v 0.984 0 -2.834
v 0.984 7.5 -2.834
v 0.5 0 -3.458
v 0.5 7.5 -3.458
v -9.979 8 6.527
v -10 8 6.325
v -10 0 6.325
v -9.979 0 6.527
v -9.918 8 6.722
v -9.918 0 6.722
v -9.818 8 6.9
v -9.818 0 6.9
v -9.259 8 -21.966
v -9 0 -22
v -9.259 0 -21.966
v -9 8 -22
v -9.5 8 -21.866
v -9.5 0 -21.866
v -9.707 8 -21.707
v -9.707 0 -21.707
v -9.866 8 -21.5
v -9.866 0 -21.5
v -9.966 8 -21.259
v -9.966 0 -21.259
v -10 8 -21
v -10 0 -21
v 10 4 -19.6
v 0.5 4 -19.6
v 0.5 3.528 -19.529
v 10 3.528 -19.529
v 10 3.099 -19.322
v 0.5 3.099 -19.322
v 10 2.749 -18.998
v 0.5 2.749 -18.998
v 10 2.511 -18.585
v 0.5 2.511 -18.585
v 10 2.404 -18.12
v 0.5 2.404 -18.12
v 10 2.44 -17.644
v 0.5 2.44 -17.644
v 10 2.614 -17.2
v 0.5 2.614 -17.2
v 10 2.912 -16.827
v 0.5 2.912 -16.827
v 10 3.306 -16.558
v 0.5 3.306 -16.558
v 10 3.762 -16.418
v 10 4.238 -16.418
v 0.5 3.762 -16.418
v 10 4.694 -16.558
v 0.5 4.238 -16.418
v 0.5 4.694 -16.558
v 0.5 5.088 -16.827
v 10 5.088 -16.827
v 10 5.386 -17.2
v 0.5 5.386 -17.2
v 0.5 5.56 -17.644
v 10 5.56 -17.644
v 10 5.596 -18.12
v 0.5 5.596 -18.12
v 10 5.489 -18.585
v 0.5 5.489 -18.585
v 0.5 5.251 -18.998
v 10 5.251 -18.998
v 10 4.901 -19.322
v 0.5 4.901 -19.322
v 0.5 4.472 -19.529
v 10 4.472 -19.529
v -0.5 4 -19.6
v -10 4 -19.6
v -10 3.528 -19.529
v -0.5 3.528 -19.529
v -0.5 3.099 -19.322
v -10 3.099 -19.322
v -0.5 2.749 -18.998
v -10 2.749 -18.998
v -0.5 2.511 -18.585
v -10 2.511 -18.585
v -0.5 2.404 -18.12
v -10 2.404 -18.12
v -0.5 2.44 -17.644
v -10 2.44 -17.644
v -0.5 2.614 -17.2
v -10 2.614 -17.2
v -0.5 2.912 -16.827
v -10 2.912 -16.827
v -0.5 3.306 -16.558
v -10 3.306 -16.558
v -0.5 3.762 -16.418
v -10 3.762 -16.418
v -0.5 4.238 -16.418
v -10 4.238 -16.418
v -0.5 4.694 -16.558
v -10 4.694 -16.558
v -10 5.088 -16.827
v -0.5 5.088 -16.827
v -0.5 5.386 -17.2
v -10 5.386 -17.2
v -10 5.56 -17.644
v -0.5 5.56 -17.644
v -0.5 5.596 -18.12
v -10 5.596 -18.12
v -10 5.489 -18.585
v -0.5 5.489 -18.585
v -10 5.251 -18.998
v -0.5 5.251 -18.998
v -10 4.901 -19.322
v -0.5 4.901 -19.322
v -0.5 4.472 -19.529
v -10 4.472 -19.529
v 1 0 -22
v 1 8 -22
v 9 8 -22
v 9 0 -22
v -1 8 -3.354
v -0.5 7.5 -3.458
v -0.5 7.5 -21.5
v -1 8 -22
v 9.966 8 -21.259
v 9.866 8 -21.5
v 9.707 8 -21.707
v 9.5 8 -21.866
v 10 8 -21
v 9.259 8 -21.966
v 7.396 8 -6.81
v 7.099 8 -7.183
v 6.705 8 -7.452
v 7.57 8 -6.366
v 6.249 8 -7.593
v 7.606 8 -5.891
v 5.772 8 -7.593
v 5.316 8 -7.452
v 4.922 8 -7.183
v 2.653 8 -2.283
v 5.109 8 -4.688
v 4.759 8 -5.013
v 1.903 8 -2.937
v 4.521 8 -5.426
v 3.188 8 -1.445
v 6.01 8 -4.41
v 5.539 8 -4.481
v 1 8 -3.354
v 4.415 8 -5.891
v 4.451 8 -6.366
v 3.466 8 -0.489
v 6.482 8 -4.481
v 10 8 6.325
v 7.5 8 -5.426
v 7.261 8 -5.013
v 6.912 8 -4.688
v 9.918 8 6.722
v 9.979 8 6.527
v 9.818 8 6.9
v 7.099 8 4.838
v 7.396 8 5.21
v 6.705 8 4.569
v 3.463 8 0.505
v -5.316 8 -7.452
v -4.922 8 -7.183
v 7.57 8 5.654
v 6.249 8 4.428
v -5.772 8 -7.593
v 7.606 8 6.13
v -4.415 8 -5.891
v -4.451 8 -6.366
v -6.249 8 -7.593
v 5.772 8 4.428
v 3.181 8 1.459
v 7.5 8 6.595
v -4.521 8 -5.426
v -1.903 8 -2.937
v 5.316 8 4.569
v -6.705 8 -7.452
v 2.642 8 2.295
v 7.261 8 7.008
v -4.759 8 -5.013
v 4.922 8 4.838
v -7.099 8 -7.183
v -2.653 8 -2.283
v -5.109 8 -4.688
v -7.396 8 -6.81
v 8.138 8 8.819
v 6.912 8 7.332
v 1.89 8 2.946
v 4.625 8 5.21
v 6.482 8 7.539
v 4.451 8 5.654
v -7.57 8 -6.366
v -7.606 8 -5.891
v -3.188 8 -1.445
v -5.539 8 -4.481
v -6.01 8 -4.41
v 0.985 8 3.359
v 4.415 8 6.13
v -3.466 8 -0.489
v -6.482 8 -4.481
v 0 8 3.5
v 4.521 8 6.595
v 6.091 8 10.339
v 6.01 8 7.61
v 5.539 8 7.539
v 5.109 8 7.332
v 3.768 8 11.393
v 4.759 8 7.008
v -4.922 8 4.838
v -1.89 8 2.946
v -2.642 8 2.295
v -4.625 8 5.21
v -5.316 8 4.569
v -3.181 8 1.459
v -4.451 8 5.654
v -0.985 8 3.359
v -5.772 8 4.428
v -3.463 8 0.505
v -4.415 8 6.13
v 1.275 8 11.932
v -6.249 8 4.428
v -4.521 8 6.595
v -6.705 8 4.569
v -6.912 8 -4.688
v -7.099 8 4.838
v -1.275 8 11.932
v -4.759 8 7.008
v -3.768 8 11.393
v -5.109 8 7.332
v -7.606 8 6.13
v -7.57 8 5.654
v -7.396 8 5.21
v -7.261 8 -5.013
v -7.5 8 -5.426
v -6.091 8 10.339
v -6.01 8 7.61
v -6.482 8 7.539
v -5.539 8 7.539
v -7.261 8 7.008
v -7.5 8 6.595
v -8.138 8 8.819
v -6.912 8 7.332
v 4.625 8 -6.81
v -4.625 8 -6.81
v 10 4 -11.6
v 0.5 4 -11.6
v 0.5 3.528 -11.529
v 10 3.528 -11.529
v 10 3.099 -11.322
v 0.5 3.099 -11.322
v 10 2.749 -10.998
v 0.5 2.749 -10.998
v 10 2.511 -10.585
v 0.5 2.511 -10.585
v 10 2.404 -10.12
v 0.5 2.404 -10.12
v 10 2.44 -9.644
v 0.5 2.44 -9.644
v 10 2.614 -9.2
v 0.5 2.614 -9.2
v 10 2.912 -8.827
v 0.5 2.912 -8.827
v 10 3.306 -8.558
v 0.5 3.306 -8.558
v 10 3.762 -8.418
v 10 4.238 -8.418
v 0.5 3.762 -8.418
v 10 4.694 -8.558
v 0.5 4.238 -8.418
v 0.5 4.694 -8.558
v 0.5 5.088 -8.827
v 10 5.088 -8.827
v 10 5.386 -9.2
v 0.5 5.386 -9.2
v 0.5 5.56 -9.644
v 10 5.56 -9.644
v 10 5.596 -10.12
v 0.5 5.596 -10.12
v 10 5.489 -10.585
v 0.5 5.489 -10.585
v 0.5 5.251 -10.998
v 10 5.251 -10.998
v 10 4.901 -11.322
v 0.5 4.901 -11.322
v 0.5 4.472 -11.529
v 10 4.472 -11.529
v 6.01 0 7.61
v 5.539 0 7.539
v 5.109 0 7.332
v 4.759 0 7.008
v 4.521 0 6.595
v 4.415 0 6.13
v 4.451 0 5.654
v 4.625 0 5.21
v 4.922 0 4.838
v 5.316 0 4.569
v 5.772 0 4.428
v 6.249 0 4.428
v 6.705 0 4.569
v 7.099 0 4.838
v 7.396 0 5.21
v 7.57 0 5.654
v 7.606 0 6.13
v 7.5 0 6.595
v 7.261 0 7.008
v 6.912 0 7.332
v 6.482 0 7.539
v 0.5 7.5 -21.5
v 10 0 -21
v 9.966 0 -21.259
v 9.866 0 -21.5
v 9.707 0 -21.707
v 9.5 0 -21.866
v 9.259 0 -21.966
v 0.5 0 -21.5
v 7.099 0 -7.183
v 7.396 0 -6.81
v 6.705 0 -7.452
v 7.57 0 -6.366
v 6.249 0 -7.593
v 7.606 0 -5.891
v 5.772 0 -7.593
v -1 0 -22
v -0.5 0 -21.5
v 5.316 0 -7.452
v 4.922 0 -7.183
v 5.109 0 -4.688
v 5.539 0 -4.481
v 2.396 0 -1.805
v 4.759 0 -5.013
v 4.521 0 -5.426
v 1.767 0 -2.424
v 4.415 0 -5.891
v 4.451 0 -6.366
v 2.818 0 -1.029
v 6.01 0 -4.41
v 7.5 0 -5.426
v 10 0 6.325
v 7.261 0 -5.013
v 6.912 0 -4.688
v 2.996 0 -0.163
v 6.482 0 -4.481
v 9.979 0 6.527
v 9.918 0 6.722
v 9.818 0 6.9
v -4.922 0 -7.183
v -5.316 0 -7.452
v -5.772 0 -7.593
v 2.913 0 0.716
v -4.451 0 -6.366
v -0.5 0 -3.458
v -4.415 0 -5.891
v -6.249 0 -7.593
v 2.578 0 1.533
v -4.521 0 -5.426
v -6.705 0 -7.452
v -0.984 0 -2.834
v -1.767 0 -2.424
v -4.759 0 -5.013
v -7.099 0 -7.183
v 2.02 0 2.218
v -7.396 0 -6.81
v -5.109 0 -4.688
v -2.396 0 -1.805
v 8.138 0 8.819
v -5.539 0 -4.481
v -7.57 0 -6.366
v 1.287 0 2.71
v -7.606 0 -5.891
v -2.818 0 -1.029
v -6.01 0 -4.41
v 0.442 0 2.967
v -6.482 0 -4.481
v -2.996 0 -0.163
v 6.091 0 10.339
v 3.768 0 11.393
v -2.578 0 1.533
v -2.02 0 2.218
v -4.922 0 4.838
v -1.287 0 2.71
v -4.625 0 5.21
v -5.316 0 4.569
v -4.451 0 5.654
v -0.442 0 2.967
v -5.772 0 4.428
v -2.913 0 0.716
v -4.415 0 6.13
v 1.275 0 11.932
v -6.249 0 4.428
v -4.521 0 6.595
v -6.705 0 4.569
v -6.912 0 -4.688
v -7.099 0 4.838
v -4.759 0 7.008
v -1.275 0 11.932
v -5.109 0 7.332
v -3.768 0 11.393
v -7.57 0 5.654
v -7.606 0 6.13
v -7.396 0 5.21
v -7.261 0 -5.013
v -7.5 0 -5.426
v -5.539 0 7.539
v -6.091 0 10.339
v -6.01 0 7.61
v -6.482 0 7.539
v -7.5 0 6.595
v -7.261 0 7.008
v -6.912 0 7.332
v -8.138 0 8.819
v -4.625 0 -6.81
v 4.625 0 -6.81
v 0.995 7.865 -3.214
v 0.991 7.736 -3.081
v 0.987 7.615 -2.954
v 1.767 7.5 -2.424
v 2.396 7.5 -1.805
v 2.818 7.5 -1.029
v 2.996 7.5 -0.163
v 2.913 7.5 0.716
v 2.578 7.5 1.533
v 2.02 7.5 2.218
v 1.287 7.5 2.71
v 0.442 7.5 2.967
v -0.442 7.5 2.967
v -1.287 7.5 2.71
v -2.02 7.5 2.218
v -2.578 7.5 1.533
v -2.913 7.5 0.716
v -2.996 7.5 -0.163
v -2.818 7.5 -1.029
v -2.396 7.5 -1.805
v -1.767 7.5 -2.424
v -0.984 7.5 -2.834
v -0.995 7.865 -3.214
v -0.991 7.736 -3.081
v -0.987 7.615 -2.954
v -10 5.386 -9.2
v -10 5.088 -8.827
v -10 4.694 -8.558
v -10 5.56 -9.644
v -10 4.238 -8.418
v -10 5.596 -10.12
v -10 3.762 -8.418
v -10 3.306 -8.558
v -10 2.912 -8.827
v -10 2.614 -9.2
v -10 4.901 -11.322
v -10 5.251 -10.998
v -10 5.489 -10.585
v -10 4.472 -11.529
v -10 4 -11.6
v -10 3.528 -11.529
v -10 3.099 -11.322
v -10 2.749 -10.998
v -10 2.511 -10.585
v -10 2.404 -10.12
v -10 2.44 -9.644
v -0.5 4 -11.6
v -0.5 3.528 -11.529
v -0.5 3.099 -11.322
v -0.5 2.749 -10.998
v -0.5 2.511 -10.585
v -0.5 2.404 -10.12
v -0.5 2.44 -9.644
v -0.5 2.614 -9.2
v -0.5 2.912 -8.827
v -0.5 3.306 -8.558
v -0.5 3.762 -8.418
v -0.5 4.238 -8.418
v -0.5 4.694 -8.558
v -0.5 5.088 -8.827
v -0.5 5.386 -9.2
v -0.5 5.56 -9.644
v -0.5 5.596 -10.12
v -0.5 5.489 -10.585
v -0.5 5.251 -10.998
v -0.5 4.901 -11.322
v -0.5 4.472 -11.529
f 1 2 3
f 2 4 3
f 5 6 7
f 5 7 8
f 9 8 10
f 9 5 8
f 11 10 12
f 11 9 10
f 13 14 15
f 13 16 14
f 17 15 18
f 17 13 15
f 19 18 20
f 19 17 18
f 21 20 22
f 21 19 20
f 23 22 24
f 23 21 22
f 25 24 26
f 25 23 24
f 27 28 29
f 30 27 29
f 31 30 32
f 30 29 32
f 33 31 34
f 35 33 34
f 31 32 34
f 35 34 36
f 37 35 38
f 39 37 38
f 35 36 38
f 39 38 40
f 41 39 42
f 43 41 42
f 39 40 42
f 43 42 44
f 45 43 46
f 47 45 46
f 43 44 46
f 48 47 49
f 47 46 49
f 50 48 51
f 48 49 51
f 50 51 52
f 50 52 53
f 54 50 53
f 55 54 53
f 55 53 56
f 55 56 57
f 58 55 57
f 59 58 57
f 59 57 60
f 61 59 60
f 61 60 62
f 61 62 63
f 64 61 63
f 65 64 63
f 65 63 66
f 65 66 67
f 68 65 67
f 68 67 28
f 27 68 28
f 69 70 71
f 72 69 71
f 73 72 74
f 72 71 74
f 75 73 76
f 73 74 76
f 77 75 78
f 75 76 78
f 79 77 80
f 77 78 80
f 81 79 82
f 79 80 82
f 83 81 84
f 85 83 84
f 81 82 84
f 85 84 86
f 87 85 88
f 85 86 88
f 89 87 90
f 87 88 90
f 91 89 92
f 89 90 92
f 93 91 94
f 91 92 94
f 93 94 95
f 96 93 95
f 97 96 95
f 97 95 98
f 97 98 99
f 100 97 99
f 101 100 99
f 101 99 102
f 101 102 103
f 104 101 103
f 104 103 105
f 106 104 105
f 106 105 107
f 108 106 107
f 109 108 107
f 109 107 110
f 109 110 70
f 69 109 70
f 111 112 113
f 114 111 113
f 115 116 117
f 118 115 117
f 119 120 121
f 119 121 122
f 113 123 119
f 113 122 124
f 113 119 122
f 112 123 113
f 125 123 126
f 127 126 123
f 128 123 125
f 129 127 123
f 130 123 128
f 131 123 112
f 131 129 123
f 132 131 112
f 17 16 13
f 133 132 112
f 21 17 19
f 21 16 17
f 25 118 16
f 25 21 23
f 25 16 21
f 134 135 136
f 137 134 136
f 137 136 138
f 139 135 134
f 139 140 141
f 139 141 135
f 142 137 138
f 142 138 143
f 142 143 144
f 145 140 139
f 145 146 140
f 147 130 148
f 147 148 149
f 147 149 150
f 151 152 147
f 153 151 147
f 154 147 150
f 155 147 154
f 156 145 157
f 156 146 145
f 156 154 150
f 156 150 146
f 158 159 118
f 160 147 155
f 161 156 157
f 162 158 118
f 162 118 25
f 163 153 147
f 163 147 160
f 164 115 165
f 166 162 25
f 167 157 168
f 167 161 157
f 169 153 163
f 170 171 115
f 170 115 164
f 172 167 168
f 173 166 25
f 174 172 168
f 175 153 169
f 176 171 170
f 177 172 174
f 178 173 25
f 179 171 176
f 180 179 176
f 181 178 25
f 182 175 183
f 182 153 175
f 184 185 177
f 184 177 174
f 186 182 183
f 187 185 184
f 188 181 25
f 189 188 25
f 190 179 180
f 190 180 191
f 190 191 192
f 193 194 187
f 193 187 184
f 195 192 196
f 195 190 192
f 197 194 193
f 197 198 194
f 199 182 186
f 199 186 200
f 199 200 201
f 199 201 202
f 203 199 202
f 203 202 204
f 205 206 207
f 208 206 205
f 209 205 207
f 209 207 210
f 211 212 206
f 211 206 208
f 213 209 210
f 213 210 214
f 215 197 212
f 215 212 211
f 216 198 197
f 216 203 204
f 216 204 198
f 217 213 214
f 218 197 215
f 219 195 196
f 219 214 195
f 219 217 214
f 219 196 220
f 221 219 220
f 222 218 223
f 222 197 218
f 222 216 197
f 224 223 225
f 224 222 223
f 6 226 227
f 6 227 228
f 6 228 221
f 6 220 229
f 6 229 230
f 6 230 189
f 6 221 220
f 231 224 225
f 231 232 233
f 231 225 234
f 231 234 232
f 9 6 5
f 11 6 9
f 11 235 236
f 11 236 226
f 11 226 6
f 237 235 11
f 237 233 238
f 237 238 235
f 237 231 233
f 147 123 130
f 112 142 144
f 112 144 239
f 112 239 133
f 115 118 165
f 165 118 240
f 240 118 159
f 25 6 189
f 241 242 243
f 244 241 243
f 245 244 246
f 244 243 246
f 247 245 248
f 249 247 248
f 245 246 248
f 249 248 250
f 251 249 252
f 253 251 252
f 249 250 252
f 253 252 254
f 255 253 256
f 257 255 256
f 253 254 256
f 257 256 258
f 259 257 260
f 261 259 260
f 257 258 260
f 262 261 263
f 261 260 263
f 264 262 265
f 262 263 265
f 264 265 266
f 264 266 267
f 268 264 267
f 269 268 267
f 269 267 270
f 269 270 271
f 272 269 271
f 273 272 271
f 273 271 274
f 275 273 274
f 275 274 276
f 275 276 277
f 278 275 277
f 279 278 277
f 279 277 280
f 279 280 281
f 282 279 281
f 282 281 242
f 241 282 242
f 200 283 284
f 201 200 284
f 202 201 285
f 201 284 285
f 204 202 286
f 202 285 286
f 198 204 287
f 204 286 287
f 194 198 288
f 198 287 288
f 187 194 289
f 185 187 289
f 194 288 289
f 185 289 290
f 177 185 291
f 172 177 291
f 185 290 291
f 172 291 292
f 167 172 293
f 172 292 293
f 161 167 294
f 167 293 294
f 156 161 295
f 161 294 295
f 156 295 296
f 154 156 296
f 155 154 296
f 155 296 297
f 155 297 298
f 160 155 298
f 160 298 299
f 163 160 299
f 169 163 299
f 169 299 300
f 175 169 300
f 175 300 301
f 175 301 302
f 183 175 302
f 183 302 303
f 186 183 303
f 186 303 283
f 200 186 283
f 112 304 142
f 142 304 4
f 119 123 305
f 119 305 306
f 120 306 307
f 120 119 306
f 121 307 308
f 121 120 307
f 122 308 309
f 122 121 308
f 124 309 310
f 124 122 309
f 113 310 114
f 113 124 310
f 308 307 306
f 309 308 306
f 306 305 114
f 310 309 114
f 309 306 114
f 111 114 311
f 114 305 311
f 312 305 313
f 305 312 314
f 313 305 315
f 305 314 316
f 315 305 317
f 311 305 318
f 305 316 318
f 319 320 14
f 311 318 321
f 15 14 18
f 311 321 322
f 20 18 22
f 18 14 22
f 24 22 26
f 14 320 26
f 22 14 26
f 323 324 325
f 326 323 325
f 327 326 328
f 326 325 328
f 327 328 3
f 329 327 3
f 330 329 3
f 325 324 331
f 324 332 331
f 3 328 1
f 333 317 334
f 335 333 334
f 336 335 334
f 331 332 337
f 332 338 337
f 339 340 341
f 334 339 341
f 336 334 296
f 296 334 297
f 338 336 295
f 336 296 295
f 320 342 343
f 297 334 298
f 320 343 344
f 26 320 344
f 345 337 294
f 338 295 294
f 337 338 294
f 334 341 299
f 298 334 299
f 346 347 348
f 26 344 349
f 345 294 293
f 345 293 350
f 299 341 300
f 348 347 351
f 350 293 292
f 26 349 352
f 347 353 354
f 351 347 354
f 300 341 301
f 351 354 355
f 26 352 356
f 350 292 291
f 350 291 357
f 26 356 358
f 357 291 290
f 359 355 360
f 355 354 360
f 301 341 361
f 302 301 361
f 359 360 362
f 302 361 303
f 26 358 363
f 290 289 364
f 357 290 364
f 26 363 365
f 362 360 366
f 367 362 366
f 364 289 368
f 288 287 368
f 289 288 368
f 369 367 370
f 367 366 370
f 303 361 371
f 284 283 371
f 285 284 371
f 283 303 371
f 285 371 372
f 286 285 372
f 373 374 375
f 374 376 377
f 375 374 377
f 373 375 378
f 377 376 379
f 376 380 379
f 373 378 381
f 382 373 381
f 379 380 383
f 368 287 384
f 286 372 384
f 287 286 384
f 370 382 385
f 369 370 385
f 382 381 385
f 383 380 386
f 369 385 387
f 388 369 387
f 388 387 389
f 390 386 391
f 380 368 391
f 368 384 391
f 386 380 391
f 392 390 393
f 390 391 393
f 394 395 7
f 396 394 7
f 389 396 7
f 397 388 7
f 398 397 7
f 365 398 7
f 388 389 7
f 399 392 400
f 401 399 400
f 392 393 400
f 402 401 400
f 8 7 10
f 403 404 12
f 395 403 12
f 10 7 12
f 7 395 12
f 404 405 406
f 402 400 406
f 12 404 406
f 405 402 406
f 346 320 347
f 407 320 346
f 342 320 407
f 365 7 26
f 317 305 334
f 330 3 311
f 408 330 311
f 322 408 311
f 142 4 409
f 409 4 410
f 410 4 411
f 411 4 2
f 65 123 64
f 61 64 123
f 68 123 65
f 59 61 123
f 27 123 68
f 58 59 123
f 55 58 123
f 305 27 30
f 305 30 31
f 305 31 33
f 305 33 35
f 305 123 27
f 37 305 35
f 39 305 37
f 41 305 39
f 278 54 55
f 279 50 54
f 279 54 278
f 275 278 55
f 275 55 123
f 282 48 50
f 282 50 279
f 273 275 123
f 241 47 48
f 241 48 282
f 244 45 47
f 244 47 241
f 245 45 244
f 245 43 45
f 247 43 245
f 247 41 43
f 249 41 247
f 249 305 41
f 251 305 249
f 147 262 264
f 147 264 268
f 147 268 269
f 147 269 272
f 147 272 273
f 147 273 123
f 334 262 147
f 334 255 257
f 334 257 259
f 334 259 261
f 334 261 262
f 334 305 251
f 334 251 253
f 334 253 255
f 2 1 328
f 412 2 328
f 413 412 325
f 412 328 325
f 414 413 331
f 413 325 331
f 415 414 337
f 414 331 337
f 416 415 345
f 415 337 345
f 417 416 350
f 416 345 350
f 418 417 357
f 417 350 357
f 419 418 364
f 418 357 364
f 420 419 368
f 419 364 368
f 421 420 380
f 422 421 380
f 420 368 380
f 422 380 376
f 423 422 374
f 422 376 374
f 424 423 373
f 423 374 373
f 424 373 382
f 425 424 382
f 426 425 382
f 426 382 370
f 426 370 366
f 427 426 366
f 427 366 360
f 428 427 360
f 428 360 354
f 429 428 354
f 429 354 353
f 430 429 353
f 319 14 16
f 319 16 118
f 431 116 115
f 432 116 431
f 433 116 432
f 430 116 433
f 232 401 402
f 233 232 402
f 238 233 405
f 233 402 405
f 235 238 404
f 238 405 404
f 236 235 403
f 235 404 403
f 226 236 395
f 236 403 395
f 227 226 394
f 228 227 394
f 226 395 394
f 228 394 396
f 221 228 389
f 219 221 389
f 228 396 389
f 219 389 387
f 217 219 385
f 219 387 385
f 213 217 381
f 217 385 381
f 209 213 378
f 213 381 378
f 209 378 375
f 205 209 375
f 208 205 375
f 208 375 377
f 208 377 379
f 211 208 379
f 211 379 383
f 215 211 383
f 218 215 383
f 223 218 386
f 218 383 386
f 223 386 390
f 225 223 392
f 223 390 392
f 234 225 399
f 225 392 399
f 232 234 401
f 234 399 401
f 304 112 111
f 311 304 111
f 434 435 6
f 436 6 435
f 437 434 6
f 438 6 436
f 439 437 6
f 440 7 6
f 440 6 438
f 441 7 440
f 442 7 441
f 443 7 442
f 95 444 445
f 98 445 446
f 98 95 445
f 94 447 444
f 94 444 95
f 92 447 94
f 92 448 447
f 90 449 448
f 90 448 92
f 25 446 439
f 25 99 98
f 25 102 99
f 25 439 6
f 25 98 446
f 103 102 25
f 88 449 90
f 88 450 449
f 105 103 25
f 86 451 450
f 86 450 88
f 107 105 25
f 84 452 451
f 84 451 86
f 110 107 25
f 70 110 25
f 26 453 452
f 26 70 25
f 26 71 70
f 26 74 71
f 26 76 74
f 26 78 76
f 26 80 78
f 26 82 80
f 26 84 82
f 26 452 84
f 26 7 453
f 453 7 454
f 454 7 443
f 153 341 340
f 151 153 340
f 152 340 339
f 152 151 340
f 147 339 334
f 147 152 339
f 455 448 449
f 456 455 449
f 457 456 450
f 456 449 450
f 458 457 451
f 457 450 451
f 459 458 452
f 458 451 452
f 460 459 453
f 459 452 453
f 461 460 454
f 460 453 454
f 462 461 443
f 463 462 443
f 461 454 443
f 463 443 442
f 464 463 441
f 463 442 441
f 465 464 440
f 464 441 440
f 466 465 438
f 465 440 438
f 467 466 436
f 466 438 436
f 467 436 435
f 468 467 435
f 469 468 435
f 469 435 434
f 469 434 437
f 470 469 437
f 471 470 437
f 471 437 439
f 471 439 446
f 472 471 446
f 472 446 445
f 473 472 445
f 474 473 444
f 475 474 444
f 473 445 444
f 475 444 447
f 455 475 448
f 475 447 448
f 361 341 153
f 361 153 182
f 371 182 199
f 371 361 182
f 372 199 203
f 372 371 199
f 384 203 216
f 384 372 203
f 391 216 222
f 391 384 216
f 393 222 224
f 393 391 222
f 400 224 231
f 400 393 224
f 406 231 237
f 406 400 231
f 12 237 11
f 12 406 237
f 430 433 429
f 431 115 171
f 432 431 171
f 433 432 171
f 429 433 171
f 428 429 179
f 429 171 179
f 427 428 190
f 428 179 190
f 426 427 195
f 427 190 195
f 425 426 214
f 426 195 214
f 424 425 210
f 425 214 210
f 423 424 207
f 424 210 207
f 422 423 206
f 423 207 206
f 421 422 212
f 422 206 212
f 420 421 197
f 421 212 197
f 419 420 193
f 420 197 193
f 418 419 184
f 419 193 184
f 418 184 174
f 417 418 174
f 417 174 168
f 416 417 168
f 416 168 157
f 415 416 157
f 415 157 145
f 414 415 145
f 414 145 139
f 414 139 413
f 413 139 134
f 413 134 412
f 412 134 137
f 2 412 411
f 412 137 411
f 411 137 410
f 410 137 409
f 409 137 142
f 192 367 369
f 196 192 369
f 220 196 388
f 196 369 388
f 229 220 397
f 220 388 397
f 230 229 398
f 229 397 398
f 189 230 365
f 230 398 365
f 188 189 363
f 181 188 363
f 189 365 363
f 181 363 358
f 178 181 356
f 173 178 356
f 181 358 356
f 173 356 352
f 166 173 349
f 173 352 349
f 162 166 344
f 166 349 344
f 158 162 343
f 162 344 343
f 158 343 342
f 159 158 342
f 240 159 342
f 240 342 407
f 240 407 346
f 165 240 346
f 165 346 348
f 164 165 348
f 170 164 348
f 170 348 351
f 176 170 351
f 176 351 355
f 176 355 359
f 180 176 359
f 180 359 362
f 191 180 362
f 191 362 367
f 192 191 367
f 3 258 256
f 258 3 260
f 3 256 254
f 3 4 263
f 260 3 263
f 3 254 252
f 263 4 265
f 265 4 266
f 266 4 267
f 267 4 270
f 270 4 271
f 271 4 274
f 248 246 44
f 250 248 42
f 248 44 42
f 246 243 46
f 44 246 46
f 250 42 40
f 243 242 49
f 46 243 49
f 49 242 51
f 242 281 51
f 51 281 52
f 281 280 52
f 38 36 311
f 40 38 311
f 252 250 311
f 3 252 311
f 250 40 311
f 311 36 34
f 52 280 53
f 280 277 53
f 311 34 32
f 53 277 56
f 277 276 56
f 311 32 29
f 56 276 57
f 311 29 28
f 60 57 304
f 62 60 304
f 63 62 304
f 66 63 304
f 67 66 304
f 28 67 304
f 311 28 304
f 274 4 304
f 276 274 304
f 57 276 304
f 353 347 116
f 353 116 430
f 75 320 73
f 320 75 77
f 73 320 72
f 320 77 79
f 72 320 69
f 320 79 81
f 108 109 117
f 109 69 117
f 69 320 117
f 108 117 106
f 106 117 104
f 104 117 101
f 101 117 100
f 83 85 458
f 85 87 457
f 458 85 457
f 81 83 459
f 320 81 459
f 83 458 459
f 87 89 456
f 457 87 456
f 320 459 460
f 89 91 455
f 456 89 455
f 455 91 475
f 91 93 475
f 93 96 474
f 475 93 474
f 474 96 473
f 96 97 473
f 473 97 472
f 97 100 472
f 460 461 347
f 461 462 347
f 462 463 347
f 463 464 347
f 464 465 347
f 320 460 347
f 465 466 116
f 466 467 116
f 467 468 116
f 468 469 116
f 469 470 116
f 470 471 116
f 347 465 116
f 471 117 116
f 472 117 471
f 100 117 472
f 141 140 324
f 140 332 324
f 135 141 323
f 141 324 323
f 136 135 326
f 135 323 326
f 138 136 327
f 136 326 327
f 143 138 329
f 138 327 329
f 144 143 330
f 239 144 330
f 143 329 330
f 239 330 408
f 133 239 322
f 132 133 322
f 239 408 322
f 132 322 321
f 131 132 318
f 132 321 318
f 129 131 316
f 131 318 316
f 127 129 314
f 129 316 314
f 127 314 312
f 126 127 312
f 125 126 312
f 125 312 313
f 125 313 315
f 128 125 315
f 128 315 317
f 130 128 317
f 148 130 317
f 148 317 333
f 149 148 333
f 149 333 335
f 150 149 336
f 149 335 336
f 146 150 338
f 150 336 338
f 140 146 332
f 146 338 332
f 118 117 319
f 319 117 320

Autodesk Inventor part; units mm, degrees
ref_plane "YZ Plane" through (0, 0, 0) normal (1, 0, 0) x (0, 1, 0)
ref_plane "XZ Plane" through (0, 0, 0) normal (0, 1, 0) x (-1, 0, 0)
ref_plane "XY Plane" through (0, 0, 0) normal (0, 0, 1) x (1, 0, 0)
sketch "スケッチ1" plane through (0, 0, 0) normal (0, 1, 0) x (-1, 0, 0)
  line L0 (-10, 12) -> (10, 12)
  line L1 (10, 12) -> (10, -22)
  line L2 (10, -22) -> (-10, -22)
  line L3 (-10, -22) -> (-10, 12)
  circle A0 centre (0, 0) radius 12
  point P0 (10, 6.6332)
  point P1 (-10, 6.6332)
  dimension "d47" = 20
  dimension "d66" = 10
  dimension "d67" = 22
  dimension "d70" = 12
extrude "押し出し1" add sketch "スケッチ1" along normal blind 8 contours A0 L1 L3 | A0 L1 L2 L3
sketch "スケッチ3" plane through (0, 8, 0) normal (0, 1, 0) x (1, 0, 0)
  circle A0 centre (0, 0) radius 8.5
  point P0 (-6.0104, 6.0104)
  point P1 (-6.0104, -6.0104)
  point P2 (6.0104, -6.0104)
  point P3 (6.0104, 6.0104)
  dimension "d6" = 17
  dimension "d9" = 360
hole "穴1" at (-6.0104, 8, -6.0104) at (-6.0104, 8, 6.0104) at (6.0104, 8, 6.0104) at (6.0104, 8, -6.0104) direction (0, -1, 0) diameter 3.2 end through all clearance for "Socket Head Cap Screw" size "M3" standard "Ansi Metric M Profile"
sketch "スケッチ2" plane through (0, 8, 0) normal (0, 1, 0) x (1, 0, 0)
  line L0 (-0.5, 0) -> (0.5, 0)
  line L1 (0.5, 0) -> (0.5, 22)
  line L2 (0.5, 22) -> (-0.5, 22)
  line L3 (-0.5, 22) -> (-0.5, 0)
  arc A0 (-10, -6.6332) -> (10, -6.6332) centre (0, 0) ccw projected
  line L4 (10, 22) -> (-10, 22) projected
  dimension "d3" = 1
  dimension "d71" = 0.5
extrude "押し出し2" cut sketch "スケッチ2" against normal blind 8
sketch "スケッチ7" plane through (10, 0, 12) normal (1, 0, 0) x (0, 0, -1)
  line L0 (5.3668, 8) -> (34, 8) projected
  line L1 (34, 0) -> (34, 8) projected
  line L2 (12, -2) -> (12, 12) projected
  point P0 (12, 0)
  point P1 (22, 4)
  point P2 (30, 4)
  dimension "d48" = 4
  dimension "d50" = 4
  dimension "d68" = 10
hole "穴4" at (10, 4, -10) at (10, 4, -18) direction (-1, 0, 0) diameter 3.2 end through all clearance for "Socket Head Cap Screw" size "M3" standard "Ansi Metric M Profile"
fillet "フィレット1" radius 1 4 edges at (10, 4, -22) (-10, 4, -22) (10, 4, 6.6332) (-10, 4, 6.6332)
sketch "スケッチ8" plane through (0, 0, 0) normal (0, -1, 0) x (1, 0, 0)
  circle A0 centre (0, 0) radius 3
  dimension "d62" = 6
extrude "押し出し4" cut sketch "スケッチ8" against normal through all
chamfer "面取り2" distance 0.5 angle 45 7 edges at (-0.5, 8, -12.479) (0.5, 8, -12.479) (0, 8, 3) (-0.5, 4, -22) (0.5, 4, -22) (0.5, 4, -2.958) (-0.5, 4, -2.958)
equation "\"d66\" = 0.5 * d47"
equation "\"d50\" = d48"
properties part number "s_base3"
